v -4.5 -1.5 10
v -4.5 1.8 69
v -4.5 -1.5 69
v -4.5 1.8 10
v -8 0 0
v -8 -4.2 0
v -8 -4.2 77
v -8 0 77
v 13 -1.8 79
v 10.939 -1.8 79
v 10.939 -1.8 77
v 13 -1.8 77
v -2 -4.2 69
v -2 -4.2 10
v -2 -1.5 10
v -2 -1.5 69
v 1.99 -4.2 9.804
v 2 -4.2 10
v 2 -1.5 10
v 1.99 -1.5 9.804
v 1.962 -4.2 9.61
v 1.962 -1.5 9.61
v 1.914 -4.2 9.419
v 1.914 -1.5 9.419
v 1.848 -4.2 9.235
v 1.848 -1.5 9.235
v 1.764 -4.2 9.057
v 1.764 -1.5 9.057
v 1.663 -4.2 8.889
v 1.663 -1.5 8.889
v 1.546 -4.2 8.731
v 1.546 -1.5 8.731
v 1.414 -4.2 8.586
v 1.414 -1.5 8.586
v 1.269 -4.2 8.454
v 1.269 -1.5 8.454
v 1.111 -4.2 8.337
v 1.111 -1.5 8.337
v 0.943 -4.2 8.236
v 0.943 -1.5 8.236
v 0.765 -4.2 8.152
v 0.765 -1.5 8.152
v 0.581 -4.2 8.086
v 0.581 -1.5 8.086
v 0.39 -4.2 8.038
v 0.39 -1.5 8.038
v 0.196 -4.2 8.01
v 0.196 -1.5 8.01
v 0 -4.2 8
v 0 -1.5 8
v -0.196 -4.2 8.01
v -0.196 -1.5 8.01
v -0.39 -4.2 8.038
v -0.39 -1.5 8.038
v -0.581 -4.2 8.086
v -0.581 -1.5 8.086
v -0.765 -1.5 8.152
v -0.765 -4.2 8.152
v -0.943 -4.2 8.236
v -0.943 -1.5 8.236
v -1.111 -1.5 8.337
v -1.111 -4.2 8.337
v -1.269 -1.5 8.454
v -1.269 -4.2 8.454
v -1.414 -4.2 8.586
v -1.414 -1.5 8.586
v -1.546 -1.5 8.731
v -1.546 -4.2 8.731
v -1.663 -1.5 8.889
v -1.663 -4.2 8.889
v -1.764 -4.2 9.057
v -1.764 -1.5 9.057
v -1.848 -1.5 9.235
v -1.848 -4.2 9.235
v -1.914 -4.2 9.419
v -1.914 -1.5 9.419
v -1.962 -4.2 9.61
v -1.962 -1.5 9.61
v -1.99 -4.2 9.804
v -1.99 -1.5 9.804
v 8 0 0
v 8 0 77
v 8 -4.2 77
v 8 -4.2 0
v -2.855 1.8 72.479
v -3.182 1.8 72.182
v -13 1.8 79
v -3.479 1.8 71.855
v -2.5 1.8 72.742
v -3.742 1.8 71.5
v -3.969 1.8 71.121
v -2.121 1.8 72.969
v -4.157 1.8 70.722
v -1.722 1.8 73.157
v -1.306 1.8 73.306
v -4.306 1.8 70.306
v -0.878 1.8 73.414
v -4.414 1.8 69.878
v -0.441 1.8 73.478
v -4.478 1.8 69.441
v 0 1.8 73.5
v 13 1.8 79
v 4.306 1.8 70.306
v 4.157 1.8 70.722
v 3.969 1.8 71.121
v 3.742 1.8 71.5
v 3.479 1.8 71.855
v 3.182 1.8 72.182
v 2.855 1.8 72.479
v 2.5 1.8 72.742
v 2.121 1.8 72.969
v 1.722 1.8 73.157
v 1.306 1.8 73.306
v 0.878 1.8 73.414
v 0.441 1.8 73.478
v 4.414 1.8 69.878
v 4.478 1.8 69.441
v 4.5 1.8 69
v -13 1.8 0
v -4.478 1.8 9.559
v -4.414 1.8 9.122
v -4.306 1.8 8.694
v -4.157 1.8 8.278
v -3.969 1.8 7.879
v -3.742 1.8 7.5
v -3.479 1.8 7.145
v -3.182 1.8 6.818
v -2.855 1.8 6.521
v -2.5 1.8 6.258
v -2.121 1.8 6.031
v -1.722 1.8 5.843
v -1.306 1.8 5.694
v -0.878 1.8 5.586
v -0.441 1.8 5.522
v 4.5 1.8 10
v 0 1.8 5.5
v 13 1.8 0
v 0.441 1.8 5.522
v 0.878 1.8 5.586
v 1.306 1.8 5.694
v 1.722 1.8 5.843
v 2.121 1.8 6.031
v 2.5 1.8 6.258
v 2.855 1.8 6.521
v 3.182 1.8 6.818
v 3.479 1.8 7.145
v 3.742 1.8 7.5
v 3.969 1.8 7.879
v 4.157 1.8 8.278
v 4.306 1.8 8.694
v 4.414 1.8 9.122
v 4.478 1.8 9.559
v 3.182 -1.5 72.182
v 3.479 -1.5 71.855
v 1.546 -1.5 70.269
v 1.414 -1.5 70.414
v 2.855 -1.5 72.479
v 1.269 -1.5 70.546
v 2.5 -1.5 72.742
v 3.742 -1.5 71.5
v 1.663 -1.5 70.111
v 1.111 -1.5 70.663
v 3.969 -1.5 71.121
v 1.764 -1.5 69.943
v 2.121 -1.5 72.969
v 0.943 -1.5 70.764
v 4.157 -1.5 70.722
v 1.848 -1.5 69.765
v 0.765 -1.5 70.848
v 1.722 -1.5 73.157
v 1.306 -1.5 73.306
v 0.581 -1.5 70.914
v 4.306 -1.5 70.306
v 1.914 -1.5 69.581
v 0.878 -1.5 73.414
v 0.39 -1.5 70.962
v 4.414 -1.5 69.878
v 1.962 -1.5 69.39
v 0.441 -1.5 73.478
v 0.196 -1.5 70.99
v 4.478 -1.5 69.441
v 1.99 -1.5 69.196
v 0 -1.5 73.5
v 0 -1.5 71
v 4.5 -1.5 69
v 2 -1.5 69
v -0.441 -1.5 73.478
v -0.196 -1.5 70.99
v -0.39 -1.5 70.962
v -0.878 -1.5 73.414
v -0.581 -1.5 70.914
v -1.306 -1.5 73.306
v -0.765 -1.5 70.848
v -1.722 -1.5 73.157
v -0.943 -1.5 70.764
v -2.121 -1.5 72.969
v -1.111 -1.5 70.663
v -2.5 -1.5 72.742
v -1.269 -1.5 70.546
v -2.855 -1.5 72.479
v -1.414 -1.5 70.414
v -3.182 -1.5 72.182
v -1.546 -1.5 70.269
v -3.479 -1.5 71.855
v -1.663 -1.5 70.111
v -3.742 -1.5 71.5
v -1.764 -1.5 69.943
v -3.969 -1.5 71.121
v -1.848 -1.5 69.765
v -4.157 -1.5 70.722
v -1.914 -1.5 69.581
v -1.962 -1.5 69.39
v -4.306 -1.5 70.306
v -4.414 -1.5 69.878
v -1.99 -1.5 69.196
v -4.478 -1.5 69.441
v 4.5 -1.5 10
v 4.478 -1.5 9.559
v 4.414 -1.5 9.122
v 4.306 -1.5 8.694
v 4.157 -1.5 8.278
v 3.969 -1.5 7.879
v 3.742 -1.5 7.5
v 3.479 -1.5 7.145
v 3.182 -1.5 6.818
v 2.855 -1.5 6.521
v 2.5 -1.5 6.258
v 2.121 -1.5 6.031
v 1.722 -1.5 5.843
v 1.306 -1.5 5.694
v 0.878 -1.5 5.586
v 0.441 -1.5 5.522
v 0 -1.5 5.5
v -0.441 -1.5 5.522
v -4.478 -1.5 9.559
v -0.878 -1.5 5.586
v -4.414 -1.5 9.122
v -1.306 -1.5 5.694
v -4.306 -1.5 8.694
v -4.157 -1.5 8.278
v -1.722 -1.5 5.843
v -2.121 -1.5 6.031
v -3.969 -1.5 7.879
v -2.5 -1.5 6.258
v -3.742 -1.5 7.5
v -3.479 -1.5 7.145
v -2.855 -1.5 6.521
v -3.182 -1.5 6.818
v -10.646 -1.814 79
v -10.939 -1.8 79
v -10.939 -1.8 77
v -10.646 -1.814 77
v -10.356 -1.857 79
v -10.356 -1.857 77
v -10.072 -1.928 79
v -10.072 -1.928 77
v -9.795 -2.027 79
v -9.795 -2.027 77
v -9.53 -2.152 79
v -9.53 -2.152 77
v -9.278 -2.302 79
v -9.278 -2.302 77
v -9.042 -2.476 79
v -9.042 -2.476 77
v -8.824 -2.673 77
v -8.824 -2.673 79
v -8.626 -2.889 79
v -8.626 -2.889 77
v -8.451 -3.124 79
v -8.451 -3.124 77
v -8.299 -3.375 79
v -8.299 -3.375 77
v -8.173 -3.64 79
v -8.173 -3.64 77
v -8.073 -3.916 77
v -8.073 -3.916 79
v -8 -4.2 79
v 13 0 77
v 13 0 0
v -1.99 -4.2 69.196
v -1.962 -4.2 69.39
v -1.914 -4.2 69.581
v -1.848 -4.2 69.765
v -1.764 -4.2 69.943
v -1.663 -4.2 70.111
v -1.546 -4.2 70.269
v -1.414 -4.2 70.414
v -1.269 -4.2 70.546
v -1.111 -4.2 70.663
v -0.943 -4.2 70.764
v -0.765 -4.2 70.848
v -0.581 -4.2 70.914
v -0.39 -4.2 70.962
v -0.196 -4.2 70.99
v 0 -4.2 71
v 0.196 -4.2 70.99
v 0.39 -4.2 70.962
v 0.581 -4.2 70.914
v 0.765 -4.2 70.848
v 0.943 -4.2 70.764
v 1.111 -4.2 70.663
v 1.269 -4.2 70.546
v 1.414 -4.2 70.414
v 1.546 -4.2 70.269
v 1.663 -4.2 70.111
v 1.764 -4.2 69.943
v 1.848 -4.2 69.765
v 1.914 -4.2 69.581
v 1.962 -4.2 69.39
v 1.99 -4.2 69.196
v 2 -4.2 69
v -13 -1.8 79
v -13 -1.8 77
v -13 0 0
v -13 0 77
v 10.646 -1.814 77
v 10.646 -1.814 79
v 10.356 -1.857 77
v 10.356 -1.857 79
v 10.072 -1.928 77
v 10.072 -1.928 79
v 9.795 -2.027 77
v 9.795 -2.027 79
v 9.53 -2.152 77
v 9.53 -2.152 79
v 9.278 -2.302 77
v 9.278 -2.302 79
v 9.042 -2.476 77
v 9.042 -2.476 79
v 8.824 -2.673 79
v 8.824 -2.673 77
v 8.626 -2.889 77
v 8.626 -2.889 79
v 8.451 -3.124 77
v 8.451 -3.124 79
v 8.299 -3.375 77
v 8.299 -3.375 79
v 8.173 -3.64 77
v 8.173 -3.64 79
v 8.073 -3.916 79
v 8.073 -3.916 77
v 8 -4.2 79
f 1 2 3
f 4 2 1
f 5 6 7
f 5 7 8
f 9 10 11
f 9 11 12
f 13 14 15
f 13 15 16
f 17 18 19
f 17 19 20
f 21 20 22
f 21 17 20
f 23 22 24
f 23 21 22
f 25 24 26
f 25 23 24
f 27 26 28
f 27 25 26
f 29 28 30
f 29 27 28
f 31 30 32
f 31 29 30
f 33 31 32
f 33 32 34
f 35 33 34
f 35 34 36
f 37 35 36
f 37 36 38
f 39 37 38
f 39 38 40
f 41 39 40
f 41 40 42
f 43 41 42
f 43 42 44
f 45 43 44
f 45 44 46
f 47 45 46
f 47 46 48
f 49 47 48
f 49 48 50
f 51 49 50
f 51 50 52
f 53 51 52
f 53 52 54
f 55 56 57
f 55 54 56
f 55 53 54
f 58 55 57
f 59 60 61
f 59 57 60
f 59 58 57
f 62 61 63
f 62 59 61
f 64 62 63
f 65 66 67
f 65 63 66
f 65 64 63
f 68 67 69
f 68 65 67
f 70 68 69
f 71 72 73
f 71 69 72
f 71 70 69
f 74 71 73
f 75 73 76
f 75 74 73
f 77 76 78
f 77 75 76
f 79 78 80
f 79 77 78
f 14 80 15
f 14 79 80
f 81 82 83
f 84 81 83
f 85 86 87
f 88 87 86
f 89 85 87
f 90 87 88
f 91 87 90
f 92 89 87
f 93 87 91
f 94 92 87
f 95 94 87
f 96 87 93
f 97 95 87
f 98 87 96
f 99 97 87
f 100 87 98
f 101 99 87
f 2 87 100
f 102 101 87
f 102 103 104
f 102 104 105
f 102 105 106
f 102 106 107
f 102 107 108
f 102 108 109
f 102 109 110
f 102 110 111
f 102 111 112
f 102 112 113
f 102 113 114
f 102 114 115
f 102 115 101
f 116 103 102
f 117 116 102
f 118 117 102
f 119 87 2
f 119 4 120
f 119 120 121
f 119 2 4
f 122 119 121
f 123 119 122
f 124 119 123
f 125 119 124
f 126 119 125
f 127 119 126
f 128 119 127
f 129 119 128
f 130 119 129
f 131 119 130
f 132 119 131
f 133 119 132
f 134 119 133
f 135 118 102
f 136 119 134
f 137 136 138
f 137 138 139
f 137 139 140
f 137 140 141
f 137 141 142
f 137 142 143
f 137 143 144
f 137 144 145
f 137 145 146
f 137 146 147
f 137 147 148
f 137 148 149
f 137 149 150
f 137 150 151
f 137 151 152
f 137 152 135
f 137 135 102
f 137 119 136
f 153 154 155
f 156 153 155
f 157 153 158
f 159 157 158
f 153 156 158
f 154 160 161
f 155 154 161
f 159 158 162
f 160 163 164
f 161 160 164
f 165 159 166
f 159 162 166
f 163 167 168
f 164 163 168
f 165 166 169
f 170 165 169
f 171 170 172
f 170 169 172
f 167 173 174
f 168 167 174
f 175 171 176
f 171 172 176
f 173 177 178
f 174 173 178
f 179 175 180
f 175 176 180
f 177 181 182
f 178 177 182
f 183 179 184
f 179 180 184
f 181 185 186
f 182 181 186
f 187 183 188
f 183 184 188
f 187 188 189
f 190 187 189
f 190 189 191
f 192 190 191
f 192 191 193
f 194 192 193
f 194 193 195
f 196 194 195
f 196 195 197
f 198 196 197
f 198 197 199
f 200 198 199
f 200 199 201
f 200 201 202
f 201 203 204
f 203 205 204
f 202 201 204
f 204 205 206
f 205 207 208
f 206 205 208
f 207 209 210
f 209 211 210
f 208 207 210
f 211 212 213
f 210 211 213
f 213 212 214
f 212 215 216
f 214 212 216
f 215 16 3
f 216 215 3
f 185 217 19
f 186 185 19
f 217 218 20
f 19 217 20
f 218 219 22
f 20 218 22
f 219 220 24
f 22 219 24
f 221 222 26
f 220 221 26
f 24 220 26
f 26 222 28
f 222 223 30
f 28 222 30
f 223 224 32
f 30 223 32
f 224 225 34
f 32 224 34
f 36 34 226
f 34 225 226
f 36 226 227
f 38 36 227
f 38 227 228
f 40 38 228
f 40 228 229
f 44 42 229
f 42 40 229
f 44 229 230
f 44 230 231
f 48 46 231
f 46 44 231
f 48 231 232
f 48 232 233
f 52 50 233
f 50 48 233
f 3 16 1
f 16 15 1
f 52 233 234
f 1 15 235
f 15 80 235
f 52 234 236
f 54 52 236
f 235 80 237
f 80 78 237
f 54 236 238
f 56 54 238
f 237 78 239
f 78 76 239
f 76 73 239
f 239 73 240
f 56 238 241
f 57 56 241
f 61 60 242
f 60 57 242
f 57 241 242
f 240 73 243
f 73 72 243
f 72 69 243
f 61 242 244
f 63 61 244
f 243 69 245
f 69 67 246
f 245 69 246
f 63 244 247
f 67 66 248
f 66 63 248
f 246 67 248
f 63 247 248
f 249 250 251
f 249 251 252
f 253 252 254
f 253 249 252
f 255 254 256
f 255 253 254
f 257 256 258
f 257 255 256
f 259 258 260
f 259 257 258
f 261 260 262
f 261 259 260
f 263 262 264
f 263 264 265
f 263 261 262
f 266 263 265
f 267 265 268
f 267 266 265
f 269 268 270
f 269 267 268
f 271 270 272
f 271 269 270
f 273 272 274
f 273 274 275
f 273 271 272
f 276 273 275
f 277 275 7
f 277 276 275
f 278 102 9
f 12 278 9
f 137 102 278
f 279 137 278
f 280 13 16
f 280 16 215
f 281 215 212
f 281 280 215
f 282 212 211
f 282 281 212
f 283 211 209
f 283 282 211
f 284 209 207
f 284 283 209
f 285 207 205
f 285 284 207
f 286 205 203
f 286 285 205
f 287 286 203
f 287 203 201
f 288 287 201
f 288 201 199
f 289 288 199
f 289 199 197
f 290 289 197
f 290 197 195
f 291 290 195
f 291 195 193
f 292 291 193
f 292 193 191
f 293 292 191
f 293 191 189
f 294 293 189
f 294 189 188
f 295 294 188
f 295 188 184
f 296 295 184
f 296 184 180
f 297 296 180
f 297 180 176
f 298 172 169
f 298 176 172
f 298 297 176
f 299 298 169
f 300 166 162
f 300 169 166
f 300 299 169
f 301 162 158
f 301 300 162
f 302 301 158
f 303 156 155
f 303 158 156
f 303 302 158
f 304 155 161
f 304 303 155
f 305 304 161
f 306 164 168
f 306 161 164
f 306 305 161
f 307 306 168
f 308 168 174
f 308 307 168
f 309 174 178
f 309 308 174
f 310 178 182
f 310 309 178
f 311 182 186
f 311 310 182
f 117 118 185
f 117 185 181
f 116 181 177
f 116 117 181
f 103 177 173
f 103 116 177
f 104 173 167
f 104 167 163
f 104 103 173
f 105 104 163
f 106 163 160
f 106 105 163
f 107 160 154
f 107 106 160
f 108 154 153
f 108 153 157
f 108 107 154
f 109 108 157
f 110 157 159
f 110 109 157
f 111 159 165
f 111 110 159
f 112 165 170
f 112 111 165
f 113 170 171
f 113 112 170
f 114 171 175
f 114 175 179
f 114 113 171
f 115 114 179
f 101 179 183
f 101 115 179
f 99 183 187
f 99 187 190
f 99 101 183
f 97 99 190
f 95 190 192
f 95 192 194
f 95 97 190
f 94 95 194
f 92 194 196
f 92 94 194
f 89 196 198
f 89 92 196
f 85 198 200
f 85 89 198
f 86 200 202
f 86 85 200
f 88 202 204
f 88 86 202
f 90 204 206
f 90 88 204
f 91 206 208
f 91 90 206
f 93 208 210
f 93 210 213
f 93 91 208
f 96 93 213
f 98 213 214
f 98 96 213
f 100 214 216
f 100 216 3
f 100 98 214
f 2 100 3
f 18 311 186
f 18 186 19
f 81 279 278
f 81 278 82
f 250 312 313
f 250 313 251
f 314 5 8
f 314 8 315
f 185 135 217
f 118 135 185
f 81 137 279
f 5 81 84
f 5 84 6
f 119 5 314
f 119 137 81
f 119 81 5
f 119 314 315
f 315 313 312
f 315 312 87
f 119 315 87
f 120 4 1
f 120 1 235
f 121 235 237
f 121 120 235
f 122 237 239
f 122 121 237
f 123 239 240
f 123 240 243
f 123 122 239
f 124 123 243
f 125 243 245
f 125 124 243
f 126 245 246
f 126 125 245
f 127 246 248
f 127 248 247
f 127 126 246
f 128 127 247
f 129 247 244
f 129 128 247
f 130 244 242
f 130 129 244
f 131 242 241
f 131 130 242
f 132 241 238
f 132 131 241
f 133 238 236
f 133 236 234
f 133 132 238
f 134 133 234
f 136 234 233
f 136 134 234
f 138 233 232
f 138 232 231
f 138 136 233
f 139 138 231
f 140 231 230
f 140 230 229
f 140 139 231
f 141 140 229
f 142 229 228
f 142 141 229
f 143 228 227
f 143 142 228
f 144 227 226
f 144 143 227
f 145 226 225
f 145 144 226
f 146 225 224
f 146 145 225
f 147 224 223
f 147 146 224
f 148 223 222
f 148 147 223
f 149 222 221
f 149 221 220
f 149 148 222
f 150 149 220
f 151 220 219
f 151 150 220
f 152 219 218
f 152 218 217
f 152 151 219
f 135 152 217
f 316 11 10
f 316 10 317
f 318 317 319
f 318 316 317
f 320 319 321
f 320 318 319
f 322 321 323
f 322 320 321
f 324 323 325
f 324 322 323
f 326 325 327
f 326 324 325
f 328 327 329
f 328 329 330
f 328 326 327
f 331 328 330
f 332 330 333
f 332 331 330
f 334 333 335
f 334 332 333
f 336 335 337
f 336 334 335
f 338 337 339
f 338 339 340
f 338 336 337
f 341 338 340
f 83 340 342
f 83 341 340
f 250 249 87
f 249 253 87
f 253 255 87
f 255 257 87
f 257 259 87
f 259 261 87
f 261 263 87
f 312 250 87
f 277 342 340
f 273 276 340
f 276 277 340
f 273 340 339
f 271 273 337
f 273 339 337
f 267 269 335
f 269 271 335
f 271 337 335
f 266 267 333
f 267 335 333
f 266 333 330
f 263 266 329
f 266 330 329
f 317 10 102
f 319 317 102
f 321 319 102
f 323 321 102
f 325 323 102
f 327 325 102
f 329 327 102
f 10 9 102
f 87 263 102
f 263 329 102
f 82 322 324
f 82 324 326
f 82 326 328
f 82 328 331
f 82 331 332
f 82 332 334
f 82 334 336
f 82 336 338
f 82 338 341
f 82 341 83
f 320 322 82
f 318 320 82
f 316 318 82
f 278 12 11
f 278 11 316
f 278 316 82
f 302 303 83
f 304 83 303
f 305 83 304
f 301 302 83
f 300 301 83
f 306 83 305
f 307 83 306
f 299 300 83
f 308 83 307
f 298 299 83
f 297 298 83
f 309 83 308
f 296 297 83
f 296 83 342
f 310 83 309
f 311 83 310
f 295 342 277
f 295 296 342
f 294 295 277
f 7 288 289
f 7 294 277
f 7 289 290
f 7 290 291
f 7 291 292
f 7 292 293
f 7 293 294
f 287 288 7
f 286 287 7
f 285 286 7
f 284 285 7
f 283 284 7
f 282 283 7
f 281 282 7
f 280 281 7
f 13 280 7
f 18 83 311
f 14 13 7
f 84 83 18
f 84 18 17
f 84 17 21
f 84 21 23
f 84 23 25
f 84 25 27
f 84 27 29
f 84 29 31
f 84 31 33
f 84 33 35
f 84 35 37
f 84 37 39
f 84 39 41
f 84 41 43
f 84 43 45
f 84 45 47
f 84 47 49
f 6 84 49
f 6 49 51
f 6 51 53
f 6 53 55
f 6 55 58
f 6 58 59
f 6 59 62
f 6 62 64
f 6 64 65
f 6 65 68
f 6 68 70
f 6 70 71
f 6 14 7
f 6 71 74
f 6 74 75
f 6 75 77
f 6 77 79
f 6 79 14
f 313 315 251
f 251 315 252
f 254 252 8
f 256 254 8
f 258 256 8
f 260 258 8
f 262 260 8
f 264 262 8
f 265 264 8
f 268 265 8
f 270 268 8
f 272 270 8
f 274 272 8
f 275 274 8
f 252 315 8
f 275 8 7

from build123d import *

# Parameters (mm, degrees)
DODANIE_WYCI_GNI_CIE1_DEPTH = 79
WYTNIJ_WYCI_GNI_CIE1_DEPTH  = 81.286985247
WYTNIJ_WYCI_GNI_CIE2_DEPTH  = 3.3
SZKIC5_W                    = 26
SZKIC5_H                    = 3.6
SDF_DEPTH                   = 2
ZAOKR_GLENIE3_R             = 3


with BuildPart() as part:
    # Szkic1 → Dodanie-wyciągnięcie1 (new body)
    with BuildSketch(Plane.XY):
        Polygon((-13, 0), (-13, 1.8), (13, 1.8), (13, 0), (8, 0), (8, -4.2), (-8, -4.2), (-8, 0), align=None)
    extrude(amount=DODANIE_WYCI_GNI_CIE1_DEPTH)

    # Szkic3 → Wytnij-wyciągnięcie1 (cut, through all)
    with BuildSketch(Plane.XZ.offset(4.2)):
        with BuildLine():
            Line((2, 69), (2, 10))
            ThreePointArc((2, 10), (0, 8), (-2, 10))
            Line((-2, 10), (-2, 69))
            ThreePointArc((-2, 69), (0, 71), (2, 69))
        make_face()
    extrude(amount=-WYTNIJ_WYCI_GNI_CIE1_DEPTH, mode=Mode.SUBTRACT)

    # Szkic4 → Wytnij-wyciągnięcie2 (cut)
    with BuildSketch(Plane(origin=(0, 1.8, 0), x_dir=(1, 0, 0), z_dir=(0, 1, 0))):
        with BuildLine():
            Line((-4.5, -69), (-4.5, -10))
            ThreePointArc((-4.5, -10), (0, -5.5), (4.5, -10))
            Line((4.5, -10), (4.5, -69))
            ThreePointArc((4.5, -69), (0, -73.5), (-4.5, -69))
        make_face()
    extrude(amount=-WYTNIJ_WYCI_GNI_CIE2_DEPTH, mode=Mode.SUBTRACT)

    # Szkic5 → sdf (add)
    with BuildSketch(Plane.XY.offset(79)):
        Rectangle(SZKIC5_W, SZKIC5_H)
    extrude(amount=-SDF_DEPTH)

    # Zaokrąglenie3
    # the kernel refuses this fillet: 3 mm, written as the material it adds along each edge
    with BuildSketch(Plane(origin=(8, -1.8, 77), x_dir=(1.5609735726224723e-12, -1.0, 0), z_dir=(0, 0, 1)), Plane(origin=(-8, -1.8, 79), x_dir=(-1.5698553568194677e-12, -1.0, 0), z_dir=(0, 0, -1))) as zaokr_glenie3_piece_1:
        with BuildLine():
            CenterArc((3, 2.939387691), ZAOKR_GLENIE3_R, 180, 78.463040967)
            Line((0, 2.939387691), (-0.06, 2.939387691))
            Line((-0.06, 2.939387691), (-0.06, 0))
            Line((-0.06, 0), (0, -0.06))
            ThreePointArc((0, -0.06), (1.2, -0.06), (2.388, -0.058787754))
            Line((2.388, -0.058787754), (2.4, 0))
        make_face()
    extrude(amount=2)


solid = part.part
